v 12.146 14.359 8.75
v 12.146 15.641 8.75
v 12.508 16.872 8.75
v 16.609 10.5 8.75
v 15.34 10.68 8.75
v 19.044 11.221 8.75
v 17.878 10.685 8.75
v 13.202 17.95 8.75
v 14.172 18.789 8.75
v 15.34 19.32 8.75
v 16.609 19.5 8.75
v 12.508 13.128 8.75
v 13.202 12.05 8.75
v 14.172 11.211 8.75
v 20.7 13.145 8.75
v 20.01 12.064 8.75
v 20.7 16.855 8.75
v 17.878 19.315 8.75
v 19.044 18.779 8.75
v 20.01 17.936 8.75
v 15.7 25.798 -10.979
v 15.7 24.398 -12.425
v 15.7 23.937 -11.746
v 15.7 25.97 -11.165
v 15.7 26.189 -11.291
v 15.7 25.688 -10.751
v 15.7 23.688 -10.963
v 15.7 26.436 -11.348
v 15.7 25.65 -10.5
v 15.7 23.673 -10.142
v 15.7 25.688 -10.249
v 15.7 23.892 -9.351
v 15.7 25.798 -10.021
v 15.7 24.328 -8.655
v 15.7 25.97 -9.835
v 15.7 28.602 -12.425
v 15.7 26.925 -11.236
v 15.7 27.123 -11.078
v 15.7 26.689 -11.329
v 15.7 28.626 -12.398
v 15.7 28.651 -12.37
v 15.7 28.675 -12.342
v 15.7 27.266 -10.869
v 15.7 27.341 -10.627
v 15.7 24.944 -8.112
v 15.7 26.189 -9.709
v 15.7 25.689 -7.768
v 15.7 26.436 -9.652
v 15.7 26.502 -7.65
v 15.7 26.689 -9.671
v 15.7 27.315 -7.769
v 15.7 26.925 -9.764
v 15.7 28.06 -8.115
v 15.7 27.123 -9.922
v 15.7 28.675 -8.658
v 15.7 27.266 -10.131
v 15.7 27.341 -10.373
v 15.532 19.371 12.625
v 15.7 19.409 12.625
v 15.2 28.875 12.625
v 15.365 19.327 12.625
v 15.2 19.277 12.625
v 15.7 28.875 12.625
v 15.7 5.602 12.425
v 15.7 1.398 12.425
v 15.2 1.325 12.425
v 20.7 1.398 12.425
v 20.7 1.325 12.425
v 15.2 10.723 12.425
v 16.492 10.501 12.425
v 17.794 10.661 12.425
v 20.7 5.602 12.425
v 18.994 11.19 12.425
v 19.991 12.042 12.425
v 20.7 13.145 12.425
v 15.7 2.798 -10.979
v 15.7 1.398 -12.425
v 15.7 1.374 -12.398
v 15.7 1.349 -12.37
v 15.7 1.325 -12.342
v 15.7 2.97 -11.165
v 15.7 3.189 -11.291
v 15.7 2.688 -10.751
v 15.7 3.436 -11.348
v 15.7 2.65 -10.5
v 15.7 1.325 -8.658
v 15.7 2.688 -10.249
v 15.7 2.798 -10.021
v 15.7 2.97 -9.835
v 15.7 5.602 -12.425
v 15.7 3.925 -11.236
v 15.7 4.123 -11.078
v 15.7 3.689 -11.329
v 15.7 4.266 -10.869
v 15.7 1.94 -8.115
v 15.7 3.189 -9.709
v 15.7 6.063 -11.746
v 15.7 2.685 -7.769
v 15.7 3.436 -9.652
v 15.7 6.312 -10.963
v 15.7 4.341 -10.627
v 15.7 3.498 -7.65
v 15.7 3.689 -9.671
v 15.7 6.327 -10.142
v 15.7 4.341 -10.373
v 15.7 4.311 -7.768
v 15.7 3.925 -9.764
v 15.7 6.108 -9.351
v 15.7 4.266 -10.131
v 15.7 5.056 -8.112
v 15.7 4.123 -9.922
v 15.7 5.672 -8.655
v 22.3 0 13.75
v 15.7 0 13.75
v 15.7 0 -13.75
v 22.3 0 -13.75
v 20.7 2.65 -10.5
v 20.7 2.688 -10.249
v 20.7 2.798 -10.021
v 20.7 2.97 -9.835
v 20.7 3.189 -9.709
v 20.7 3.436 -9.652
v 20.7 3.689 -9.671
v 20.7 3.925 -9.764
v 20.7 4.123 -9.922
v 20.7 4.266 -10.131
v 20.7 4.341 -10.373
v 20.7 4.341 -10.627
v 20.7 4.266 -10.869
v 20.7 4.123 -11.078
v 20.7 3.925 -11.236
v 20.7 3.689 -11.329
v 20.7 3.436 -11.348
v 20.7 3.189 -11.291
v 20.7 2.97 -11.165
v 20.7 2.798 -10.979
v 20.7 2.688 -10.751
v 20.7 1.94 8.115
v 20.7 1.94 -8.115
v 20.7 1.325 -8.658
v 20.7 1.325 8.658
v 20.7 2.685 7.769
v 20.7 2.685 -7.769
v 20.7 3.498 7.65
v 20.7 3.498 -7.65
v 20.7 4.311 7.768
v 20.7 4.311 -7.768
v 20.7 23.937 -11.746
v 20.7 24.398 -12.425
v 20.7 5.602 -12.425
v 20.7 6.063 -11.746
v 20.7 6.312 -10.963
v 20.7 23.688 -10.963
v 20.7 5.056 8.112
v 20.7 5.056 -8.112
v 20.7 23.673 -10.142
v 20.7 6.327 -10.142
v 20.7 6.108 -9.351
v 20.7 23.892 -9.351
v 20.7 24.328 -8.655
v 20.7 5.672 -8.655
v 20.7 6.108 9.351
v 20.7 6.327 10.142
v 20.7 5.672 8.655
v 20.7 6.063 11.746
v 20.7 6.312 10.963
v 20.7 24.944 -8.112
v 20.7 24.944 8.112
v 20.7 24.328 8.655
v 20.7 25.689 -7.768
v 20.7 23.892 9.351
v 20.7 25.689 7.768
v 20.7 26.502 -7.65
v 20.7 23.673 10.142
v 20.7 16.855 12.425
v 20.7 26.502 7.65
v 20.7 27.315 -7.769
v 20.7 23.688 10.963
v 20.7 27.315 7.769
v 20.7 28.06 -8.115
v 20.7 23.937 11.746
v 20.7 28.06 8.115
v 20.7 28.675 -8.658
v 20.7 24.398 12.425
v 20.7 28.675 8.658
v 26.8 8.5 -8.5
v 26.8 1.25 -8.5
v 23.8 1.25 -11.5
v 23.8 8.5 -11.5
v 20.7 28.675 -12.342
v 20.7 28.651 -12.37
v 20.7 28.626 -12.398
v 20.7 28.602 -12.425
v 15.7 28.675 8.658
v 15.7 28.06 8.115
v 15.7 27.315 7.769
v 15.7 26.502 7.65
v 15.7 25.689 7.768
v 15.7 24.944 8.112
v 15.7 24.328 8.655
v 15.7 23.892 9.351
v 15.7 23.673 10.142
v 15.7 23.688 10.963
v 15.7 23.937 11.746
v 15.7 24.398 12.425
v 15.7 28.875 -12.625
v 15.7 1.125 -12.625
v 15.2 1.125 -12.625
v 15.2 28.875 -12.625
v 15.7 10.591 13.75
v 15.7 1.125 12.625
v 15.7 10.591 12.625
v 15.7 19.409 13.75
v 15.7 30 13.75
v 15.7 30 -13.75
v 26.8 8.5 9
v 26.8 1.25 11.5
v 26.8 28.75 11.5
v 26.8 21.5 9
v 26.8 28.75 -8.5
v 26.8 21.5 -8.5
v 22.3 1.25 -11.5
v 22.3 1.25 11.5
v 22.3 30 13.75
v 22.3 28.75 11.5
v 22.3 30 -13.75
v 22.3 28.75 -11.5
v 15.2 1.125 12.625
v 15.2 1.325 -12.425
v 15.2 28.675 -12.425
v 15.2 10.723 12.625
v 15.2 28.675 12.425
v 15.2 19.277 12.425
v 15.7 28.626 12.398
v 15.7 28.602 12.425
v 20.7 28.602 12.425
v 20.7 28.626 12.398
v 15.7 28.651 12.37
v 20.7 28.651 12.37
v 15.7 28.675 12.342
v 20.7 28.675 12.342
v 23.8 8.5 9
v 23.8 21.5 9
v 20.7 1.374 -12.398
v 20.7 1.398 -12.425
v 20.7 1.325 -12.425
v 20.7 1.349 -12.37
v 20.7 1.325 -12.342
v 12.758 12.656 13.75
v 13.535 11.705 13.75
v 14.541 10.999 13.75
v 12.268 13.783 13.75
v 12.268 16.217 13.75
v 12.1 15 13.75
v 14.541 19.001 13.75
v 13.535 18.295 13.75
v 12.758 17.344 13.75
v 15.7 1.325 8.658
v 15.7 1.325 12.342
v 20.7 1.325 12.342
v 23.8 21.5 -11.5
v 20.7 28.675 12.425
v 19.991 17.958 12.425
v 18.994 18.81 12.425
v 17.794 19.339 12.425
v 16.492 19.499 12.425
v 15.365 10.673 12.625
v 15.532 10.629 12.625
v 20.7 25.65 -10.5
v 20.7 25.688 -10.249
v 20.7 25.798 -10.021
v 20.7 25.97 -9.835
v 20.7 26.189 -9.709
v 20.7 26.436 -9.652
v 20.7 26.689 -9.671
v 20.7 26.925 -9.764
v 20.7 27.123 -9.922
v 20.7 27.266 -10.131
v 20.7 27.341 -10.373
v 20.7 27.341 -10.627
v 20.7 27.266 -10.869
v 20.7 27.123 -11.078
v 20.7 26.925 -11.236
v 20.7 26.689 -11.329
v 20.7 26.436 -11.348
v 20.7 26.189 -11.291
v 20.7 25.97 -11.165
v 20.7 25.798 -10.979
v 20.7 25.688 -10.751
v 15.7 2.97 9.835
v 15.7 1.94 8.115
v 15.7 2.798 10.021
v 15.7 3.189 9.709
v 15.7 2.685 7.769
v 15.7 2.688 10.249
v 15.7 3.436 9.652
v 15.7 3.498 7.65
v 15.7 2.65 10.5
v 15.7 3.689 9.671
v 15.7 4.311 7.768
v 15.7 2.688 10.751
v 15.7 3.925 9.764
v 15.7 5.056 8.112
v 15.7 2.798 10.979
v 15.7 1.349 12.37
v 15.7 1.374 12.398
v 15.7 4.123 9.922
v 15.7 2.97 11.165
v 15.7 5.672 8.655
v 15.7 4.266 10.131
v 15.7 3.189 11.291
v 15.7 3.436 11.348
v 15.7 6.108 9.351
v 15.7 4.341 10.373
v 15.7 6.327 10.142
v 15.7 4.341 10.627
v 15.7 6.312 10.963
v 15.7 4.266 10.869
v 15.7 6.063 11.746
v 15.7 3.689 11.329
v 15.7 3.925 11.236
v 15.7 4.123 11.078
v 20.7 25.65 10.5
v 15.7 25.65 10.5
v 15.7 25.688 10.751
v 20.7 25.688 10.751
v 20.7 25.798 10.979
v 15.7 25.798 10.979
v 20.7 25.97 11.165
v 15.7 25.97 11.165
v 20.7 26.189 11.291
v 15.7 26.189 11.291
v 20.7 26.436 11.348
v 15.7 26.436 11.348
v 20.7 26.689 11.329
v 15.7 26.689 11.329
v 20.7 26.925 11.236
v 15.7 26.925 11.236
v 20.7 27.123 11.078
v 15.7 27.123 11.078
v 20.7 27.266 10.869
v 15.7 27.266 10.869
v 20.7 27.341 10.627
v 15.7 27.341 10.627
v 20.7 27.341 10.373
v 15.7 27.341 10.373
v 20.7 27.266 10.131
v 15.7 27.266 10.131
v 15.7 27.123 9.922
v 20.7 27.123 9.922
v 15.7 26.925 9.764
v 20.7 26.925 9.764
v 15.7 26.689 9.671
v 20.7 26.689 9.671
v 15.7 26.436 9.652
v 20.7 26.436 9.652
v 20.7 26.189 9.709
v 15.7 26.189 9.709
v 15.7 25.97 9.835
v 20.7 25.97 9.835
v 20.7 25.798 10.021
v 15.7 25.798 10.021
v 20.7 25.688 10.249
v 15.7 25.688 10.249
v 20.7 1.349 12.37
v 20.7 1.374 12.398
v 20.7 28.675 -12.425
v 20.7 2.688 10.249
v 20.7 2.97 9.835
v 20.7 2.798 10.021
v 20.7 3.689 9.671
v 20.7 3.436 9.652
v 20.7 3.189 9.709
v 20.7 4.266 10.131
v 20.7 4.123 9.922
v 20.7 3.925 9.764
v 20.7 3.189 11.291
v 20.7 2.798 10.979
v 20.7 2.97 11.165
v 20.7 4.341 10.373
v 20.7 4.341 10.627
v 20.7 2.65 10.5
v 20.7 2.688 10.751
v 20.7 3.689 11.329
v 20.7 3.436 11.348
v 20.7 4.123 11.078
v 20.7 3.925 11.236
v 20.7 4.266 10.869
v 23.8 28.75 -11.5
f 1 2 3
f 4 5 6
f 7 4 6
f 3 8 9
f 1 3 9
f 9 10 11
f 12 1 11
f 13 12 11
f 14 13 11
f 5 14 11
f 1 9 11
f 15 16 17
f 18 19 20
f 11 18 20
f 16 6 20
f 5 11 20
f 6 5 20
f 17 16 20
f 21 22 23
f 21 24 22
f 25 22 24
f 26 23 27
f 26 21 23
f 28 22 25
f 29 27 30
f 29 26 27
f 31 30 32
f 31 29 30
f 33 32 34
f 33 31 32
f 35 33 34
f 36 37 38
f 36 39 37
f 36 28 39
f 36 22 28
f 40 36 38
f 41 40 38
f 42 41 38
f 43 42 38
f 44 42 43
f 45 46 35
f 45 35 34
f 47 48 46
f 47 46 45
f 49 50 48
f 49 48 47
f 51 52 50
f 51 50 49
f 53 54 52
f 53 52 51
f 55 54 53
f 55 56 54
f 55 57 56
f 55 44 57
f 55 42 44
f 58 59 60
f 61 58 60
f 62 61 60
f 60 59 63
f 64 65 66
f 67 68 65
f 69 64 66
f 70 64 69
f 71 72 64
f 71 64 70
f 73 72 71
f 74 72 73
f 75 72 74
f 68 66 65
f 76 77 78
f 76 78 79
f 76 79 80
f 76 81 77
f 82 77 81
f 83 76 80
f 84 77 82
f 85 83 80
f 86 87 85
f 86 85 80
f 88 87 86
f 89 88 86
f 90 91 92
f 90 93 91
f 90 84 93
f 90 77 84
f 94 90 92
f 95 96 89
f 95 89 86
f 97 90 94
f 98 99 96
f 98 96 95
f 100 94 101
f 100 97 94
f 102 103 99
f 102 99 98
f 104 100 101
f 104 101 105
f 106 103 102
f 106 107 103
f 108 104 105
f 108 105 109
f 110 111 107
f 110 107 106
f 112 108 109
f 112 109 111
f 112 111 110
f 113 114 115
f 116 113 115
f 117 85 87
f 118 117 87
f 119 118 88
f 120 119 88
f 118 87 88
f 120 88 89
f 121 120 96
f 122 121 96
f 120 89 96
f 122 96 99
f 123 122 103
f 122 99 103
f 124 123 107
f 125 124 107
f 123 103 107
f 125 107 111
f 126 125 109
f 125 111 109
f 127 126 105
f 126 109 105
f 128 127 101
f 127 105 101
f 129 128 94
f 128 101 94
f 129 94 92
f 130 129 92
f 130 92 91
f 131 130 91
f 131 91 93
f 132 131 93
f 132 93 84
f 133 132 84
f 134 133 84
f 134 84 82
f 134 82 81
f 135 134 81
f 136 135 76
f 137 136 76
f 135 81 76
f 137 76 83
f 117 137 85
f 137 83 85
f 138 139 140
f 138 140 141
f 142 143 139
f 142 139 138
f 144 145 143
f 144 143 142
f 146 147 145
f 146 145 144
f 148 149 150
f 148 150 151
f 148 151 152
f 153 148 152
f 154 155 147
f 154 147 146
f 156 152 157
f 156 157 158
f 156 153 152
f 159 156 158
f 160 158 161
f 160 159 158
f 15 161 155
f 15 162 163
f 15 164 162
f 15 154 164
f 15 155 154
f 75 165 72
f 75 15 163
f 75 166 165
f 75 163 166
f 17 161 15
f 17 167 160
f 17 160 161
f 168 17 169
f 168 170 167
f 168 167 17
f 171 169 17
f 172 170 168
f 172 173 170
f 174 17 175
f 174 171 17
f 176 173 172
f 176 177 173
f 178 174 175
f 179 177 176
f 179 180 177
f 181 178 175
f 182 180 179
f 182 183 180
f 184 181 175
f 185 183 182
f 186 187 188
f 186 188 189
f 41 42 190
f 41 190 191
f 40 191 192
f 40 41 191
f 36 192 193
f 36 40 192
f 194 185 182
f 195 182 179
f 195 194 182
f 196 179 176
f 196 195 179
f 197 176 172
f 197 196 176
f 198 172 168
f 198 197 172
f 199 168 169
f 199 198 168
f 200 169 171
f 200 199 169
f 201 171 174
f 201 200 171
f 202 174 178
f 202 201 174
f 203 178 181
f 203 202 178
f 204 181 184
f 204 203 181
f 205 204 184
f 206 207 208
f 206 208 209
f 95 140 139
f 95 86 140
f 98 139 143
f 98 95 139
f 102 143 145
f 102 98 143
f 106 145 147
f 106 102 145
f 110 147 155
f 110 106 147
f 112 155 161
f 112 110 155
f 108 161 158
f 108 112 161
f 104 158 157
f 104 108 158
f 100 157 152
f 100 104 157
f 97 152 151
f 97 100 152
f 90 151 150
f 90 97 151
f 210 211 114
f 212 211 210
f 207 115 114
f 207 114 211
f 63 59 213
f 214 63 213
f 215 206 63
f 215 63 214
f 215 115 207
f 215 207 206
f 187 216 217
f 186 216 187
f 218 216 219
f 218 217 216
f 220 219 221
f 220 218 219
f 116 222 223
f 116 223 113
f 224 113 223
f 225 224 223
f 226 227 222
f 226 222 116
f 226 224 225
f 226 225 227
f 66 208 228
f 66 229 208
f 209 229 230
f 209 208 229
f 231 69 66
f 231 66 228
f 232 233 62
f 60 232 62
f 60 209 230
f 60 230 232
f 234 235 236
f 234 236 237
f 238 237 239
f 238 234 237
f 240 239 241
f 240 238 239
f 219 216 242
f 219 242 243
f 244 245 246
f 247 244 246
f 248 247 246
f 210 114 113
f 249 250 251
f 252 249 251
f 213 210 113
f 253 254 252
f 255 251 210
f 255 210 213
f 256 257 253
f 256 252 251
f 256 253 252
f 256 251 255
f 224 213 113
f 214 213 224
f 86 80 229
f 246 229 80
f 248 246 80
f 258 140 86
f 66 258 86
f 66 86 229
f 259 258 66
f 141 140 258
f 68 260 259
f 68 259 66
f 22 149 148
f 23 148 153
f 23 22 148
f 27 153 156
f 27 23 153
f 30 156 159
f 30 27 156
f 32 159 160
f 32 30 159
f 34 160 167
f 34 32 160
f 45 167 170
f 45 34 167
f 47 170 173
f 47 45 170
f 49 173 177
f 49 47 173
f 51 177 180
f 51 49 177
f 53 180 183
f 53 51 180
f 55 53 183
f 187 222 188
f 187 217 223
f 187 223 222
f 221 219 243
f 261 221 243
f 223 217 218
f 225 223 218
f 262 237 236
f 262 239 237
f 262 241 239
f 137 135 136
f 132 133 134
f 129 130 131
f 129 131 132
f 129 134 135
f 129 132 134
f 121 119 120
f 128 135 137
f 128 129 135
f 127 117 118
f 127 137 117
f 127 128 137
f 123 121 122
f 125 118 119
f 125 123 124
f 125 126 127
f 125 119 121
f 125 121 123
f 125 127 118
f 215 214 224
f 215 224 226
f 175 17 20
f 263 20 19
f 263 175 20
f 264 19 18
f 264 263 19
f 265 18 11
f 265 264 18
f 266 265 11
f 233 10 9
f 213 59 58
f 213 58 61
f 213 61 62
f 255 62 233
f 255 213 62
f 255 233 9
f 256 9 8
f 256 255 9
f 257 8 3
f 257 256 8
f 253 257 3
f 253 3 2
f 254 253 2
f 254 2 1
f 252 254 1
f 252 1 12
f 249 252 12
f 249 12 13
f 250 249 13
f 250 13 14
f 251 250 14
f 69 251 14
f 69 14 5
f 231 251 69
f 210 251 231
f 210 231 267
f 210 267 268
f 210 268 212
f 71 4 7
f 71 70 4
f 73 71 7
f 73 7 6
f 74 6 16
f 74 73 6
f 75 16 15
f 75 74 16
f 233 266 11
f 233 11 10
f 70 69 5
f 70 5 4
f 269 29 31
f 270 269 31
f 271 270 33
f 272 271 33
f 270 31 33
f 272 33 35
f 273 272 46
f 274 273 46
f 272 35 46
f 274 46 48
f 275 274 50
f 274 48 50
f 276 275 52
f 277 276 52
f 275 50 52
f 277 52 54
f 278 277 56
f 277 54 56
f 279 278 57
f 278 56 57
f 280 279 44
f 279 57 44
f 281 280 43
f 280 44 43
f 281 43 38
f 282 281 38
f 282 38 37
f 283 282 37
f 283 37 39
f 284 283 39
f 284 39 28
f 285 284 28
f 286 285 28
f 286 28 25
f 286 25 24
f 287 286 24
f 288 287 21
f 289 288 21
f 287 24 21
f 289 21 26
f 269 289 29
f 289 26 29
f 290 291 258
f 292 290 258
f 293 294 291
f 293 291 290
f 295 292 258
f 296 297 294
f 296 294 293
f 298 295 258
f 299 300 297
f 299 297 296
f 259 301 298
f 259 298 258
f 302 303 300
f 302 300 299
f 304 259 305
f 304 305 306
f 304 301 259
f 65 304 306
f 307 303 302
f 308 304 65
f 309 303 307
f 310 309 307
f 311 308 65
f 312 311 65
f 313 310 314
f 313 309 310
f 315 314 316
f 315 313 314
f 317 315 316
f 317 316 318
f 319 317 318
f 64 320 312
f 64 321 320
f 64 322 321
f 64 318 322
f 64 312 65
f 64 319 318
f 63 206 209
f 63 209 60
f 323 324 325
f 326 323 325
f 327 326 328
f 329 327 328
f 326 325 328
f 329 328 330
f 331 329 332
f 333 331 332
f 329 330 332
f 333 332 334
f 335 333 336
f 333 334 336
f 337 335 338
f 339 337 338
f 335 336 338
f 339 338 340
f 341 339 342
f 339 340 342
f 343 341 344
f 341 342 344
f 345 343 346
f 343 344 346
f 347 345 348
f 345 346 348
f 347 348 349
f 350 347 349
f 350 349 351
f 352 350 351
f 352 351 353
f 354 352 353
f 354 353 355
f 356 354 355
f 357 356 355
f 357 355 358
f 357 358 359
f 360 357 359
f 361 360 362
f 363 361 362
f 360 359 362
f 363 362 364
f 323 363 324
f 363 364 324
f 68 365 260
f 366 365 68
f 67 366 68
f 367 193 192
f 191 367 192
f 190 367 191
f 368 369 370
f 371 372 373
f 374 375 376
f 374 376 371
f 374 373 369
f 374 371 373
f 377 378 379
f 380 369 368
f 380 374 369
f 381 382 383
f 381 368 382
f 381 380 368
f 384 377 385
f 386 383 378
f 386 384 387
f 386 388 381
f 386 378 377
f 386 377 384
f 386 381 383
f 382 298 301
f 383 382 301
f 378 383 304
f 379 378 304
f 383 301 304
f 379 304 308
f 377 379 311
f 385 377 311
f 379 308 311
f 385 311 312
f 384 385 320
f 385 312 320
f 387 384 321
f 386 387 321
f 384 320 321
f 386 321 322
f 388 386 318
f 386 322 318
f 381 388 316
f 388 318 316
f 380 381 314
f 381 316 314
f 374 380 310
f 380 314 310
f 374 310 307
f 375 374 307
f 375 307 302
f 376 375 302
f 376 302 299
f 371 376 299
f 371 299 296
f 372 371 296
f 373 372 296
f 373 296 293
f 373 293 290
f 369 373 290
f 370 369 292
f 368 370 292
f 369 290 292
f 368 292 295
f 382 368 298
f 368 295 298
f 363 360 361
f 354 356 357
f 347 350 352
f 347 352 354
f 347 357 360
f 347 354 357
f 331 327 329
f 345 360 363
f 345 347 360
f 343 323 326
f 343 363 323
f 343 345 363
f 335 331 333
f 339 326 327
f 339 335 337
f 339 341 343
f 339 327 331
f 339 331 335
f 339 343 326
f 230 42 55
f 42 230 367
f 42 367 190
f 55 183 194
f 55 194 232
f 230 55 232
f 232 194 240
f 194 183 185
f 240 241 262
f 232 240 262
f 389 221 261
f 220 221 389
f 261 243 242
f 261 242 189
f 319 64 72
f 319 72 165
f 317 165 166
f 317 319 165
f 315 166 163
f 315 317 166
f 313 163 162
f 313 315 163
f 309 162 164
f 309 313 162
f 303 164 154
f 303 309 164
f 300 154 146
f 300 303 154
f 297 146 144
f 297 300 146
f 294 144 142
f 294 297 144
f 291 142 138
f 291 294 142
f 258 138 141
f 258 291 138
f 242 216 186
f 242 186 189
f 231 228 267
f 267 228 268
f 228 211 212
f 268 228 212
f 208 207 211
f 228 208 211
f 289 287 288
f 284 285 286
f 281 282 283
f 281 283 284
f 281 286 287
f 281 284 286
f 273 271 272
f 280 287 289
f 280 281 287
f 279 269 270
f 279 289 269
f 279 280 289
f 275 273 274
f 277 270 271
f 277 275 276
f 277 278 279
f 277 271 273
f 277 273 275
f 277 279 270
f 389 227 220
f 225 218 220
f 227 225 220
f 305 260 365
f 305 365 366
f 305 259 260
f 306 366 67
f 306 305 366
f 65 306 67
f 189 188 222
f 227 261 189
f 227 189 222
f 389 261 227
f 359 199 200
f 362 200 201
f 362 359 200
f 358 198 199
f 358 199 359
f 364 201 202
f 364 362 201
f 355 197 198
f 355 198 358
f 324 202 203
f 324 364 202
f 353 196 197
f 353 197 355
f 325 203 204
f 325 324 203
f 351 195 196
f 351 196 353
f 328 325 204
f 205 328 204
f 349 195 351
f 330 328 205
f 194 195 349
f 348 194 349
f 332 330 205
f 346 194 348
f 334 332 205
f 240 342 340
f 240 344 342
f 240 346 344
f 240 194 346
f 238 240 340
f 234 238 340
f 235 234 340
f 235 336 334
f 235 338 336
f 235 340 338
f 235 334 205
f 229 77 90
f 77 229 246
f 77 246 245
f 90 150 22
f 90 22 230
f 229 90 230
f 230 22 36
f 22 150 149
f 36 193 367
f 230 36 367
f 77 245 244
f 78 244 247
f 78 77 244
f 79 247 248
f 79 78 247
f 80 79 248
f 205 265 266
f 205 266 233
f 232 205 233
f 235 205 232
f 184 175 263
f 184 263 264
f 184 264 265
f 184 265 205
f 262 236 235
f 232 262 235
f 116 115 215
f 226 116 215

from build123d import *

# Parameters (mm, degrees)
SKETCH_1_R                 = 2.9
EXTRUDE_1_DEPTH            = 30
SKETCH_2_W                 = 27.5
SKETCH_2_H                 = 30
EXTRUDE_2_DEPTH            = 17
CUT_EXTRUDE_1_REACH        = 39.833
SKETCH_3_W                 = 27.5
SKETCH_3_H                 = 19.8
SKETCH_4_W                 = 27.5
SKETCH_4_H                 = 30
SKETCH_4_W_2               = 23
SKETCH_4_H_2               = 27.5
CUT_EXTRUDE_2_DEPTH        = 4.5
CHAMFER_1_SIZE             = 3
SKETCH_5_W                 = 20.5
SKETCH_5_H                 = 13
CUT_EXTRUDE_3_DEPTH        = 3
SKETCH_6_R                 = 7.5
SKETCH_6_R_2               = 2.9
EXTRUDE_3_DEPTH            = 2.2
CHAMFER_2_SIZE             = 2
CHAMFER_2_OF_MIRROR_1_SIZE = 2
CUT_EXTRUDE_4_REACH        = 52.113
SKETCH_7_W                 = 25
SKETCH_7_H                 = 34.4
SKETCH_8_W                 = 25.25
SKETCH_8_H                 = 27.75
SKETCH_8_W_2               = 24.85
SKETCH_8_H_2               = 27.35
EXTRUDE_4_DEPTH            = 0.5
SKETCH_9_W                 = 24.85
SKETCH_9_H                 = 27.35
CUT_EXTRUDE_5_DEPTH        = 5
SKETCH_10_R                = 4.5
EXTRUDE_5_DEPTH            = 5
SKETCH_11_R                = 2.85
SKETCH_11_R_2              = 0.85
EXTRUDE_6_DEPTH            = 5


with BuildPart() as part:
    # 草图1 → 凸台-拉伸1 (new body)
    with BuildSketch(Plane(origin=(0, 0, 0), x_dir=(1, 0, 0), z_dir=(0, 1, 0))):
        with BuildLine():
            Line((-0.305751289, 8.694625705), (9.8, 9.05))
            Line((9.8, 9.05), (9.8, -9.05))
            Line((9.8, -9.05), (-0.305751289, -8.694625705))
            ThreePointArc((-0.305751289, -8.694625705), (-8.7, 0), (-0.305751289, 8.694625705))
        make_face()
        with Locations(Location((0, 0, 0), (0, 0, 270))):
            Circle(SKETCH_1_R, mode=Mode.SUBTRACT)
    extrude(amount=EXTRUDE_1_DEPTH)

    # 草图2 → 凸台-拉伸2 (add)
    with BuildSketch(Plane(origin=(9.8, 0, 0), x_dir=(0, 0, -1), z_dir=(1, 0, 0))):
        with Locations((0, 15)):
            Rectangle(SKETCH_2_W, SKETCH_2_H)
    extrude(amount=EXTRUDE_2_DEPTH)

    # 草图3 → 切除-拉伸1 (cut, up to next)
    with BuildSketch(Plane.ZY.offset(-9.8), mode=Mode.PRIVATE) as cut_extrude_1_sk1:
        with Locations((0, 15)):
            Rectangle(SKETCH_3_W, SKETCH_3_H)
    cut_extrude_1_tool1 = extrude(cut_extrude_1_sk1.sketch, amount=CUT_EXTRUDE_1_REACH, mode=Mode.PRIVATE) & part.part
    add(cut_extrude_1_tool1.solids().sort_by_distance((9.8, 15, 0))[0], mode=Mode.SUBTRACT)

    # 草图4 → 切除-拉伸2 (cut)
    with BuildSketch(Plane(origin=(26.8, 0, 0), x_dir=(0, 0, -1), z_dir=(1, 0, 0))):
        with Locations((0, 15)):
            Rectangle(SKETCH_4_W, SKETCH_4_H)
        with Locations((0, 15)):
            Rectangle(SKETCH_4_W_2, SKETCH_4_H_2, mode=Mode.SUBTRACT)
    extrude(amount=-CUT_EXTRUDE_2_DEPTH, mode=Mode.SUBTRACT)

    # 倒角1
    chamfer_1_edges = [part.edges().sort_by_distance(p)[0] for p in [
        (26.8, 15, -11.5),
    ]]
    chamfer(chamfer_1_edges, length=CHAMFER_1_SIZE)

    # 草图5 → 切除-拉伸3 (cut)
    with BuildSketch(Plane(origin=(26.8, 0, 0), x_dir=(0, 0, -1), z_dir=(1, 0, 0))):
        with Locations((1.25, 15)):
            Rectangle(SKETCH_5_W, SKETCH_5_H)
    extrude(amount=-CUT_EXTRUDE_3_DEPTH, mode=Mode.SUBTRACT)

    # 草图6 → 凸台-拉伸3 (add)
    with BuildSketch(Plane(origin=(0, 30, 0), x_dir=(1, 0, 0), z_dir=(0, 1, 0))):
        with Locations(Location((0, 0, 0), (0, 0, 270))):
            Circle(SKETCH_6_R)
        with Locations(Location((0, 0, 0), (0, 0, 270))):
            Circle(SKETCH_6_R_2, mode=Mode.SUBTRACT)
    extrude_3 = extrude(amount=EXTRUDE_3_DEPTH)

    # 倒角2
    chamfer_2_edges = [part.edges().sort_by_distance(p)[0] for p in [
        (0, 32.2, -7.5),
    ]]
    chamfer(chamfer_2_edges, length=CHAMFER_2_SIZE)

    # 镜向1: 凸台-拉伸3 across plane
    add(extrude_3.mirror(Plane(origin=(0, 15, 0), x_dir=(0, 0, 1), z_dir=(0, -1, 0))))

    # 倒角2 of 镜向1
    chamfer_2_of_mirror_1_edges = [part.edges().sort_by_distance(p)[0] for p in [
        (0, -2.2, -7.5),
    ]]
    chamfer(chamfer_2_of_mirror_1_edges, length=CHAMFER_2_OF_MIRROR_1_SIZE)

    # 草图7 → 切除-拉伸4 (cut, up to next)
    with BuildSketch(Plane(origin=(0, 0, -13.75), x_dir=(-1, 0, 0), z_dir=(0, 0, -1)), mode=Mode.PRIVATE) as cut_extrude_4_sk1:
        with Locations((-3.2, 15)):
            Rectangle(SKETCH_7_W, SKETCH_7_H)
    cut_extrude_4_tool1 = extrude(cut_extrude_4_sk1.sketch, amount=-CUT_EXTRUDE_4_REACH, mode=Mode.PRIVATE) & part.part
    add(cut_extrude_4_tool1.solids().sort_by_distance((3.2, 15, -13.75))[0], mode=Mode.SUBTRACT)

    # 草图8 → 凸台-拉伸4 (add)
    with BuildSketch(Plane.ZY.offset(-15.7)):
        with Locations((0, 15)):
            Rectangle(SKETCH_8_W, SKETCH_8_H)
        with Locations((0, 15)):
            Rectangle(SKETCH_8_W_2, SKETCH_8_H_2, mode=Mode.SUBTRACT)
    extrude(amount=EXTRUDE_4_DEPTH)

    # 草图9 → 切除-拉伸5 (cut)
    with BuildSketch(Plane.ZY.offset(-15.7)):
        with Locations((0, 15)):
            Rectangle(SKETCH_9_W, SKETCH_9_H)
    extrude(amount=-CUT_EXTRUDE_5_DEPTH, mode=Mode.SUBTRACT)

    # 草图10 → 凸台-拉伸5 (add)
    with BuildSketch(Plane.XY.offset(13.75)):
        with Locations((16.6, 15)):
            Circle(SKETCH_10_R)
    extrude(amount=-EXTRUDE_5_DEPTH)

    # 草图11 → 凸台-拉伸6 (add)
    # profile 1 of 4: a face of its own
    with BuildSketch(Plane.ZY.offset(-15.7)):
        with Locations((-10.5, 26.5)):
            Circle(SKETCH_11_R)
        with Locations(Location((-10.5, 26.5, 0), (0, 0, 270))):
            Circle(SKETCH_11_R_2, mode=Mode.SUBTRACT)
    # profile 2 of 4: a face of its own
    with BuildSketch(Plane.ZY.offset(-15.7)):
        with Locations((10.5, 26.5)):
            Circle(SKETCH_11_R)
        with Locations(Location((10.5, 26.5, 0), (0, 0, 270))):
            Circle(SKETCH_11_R_2, mode=Mode.SUBTRACT)
    # profile 3 of 4: a face of its own
    with BuildSketch(Plane.ZY.offset(-15.7)):
        with Locations((-10.5, 3.5)):
            Circle(SKETCH_11_R)
        with Locations(Location((-10.5, 3.5, 0), (0, 0, 270))):
            Circle(SKETCH_11_R_2, mode=Mode.SUBTRACT)
    # profile 4 of 4: a face of its own
    with BuildSketch(Plane.ZY.offset(-15.7)):
        with Locations((10.5, 3.5)):
            Circle(SKETCH_11_R)
        with Locations(Location((10.5, 3.5, 0), (0, 0, 270))):
            Circle(SKETCH_11_R_2, mode=Mode.SUBTRACT)
    extrude(amount=-EXTRUDE_6_DEPTH)


solid = part.part
